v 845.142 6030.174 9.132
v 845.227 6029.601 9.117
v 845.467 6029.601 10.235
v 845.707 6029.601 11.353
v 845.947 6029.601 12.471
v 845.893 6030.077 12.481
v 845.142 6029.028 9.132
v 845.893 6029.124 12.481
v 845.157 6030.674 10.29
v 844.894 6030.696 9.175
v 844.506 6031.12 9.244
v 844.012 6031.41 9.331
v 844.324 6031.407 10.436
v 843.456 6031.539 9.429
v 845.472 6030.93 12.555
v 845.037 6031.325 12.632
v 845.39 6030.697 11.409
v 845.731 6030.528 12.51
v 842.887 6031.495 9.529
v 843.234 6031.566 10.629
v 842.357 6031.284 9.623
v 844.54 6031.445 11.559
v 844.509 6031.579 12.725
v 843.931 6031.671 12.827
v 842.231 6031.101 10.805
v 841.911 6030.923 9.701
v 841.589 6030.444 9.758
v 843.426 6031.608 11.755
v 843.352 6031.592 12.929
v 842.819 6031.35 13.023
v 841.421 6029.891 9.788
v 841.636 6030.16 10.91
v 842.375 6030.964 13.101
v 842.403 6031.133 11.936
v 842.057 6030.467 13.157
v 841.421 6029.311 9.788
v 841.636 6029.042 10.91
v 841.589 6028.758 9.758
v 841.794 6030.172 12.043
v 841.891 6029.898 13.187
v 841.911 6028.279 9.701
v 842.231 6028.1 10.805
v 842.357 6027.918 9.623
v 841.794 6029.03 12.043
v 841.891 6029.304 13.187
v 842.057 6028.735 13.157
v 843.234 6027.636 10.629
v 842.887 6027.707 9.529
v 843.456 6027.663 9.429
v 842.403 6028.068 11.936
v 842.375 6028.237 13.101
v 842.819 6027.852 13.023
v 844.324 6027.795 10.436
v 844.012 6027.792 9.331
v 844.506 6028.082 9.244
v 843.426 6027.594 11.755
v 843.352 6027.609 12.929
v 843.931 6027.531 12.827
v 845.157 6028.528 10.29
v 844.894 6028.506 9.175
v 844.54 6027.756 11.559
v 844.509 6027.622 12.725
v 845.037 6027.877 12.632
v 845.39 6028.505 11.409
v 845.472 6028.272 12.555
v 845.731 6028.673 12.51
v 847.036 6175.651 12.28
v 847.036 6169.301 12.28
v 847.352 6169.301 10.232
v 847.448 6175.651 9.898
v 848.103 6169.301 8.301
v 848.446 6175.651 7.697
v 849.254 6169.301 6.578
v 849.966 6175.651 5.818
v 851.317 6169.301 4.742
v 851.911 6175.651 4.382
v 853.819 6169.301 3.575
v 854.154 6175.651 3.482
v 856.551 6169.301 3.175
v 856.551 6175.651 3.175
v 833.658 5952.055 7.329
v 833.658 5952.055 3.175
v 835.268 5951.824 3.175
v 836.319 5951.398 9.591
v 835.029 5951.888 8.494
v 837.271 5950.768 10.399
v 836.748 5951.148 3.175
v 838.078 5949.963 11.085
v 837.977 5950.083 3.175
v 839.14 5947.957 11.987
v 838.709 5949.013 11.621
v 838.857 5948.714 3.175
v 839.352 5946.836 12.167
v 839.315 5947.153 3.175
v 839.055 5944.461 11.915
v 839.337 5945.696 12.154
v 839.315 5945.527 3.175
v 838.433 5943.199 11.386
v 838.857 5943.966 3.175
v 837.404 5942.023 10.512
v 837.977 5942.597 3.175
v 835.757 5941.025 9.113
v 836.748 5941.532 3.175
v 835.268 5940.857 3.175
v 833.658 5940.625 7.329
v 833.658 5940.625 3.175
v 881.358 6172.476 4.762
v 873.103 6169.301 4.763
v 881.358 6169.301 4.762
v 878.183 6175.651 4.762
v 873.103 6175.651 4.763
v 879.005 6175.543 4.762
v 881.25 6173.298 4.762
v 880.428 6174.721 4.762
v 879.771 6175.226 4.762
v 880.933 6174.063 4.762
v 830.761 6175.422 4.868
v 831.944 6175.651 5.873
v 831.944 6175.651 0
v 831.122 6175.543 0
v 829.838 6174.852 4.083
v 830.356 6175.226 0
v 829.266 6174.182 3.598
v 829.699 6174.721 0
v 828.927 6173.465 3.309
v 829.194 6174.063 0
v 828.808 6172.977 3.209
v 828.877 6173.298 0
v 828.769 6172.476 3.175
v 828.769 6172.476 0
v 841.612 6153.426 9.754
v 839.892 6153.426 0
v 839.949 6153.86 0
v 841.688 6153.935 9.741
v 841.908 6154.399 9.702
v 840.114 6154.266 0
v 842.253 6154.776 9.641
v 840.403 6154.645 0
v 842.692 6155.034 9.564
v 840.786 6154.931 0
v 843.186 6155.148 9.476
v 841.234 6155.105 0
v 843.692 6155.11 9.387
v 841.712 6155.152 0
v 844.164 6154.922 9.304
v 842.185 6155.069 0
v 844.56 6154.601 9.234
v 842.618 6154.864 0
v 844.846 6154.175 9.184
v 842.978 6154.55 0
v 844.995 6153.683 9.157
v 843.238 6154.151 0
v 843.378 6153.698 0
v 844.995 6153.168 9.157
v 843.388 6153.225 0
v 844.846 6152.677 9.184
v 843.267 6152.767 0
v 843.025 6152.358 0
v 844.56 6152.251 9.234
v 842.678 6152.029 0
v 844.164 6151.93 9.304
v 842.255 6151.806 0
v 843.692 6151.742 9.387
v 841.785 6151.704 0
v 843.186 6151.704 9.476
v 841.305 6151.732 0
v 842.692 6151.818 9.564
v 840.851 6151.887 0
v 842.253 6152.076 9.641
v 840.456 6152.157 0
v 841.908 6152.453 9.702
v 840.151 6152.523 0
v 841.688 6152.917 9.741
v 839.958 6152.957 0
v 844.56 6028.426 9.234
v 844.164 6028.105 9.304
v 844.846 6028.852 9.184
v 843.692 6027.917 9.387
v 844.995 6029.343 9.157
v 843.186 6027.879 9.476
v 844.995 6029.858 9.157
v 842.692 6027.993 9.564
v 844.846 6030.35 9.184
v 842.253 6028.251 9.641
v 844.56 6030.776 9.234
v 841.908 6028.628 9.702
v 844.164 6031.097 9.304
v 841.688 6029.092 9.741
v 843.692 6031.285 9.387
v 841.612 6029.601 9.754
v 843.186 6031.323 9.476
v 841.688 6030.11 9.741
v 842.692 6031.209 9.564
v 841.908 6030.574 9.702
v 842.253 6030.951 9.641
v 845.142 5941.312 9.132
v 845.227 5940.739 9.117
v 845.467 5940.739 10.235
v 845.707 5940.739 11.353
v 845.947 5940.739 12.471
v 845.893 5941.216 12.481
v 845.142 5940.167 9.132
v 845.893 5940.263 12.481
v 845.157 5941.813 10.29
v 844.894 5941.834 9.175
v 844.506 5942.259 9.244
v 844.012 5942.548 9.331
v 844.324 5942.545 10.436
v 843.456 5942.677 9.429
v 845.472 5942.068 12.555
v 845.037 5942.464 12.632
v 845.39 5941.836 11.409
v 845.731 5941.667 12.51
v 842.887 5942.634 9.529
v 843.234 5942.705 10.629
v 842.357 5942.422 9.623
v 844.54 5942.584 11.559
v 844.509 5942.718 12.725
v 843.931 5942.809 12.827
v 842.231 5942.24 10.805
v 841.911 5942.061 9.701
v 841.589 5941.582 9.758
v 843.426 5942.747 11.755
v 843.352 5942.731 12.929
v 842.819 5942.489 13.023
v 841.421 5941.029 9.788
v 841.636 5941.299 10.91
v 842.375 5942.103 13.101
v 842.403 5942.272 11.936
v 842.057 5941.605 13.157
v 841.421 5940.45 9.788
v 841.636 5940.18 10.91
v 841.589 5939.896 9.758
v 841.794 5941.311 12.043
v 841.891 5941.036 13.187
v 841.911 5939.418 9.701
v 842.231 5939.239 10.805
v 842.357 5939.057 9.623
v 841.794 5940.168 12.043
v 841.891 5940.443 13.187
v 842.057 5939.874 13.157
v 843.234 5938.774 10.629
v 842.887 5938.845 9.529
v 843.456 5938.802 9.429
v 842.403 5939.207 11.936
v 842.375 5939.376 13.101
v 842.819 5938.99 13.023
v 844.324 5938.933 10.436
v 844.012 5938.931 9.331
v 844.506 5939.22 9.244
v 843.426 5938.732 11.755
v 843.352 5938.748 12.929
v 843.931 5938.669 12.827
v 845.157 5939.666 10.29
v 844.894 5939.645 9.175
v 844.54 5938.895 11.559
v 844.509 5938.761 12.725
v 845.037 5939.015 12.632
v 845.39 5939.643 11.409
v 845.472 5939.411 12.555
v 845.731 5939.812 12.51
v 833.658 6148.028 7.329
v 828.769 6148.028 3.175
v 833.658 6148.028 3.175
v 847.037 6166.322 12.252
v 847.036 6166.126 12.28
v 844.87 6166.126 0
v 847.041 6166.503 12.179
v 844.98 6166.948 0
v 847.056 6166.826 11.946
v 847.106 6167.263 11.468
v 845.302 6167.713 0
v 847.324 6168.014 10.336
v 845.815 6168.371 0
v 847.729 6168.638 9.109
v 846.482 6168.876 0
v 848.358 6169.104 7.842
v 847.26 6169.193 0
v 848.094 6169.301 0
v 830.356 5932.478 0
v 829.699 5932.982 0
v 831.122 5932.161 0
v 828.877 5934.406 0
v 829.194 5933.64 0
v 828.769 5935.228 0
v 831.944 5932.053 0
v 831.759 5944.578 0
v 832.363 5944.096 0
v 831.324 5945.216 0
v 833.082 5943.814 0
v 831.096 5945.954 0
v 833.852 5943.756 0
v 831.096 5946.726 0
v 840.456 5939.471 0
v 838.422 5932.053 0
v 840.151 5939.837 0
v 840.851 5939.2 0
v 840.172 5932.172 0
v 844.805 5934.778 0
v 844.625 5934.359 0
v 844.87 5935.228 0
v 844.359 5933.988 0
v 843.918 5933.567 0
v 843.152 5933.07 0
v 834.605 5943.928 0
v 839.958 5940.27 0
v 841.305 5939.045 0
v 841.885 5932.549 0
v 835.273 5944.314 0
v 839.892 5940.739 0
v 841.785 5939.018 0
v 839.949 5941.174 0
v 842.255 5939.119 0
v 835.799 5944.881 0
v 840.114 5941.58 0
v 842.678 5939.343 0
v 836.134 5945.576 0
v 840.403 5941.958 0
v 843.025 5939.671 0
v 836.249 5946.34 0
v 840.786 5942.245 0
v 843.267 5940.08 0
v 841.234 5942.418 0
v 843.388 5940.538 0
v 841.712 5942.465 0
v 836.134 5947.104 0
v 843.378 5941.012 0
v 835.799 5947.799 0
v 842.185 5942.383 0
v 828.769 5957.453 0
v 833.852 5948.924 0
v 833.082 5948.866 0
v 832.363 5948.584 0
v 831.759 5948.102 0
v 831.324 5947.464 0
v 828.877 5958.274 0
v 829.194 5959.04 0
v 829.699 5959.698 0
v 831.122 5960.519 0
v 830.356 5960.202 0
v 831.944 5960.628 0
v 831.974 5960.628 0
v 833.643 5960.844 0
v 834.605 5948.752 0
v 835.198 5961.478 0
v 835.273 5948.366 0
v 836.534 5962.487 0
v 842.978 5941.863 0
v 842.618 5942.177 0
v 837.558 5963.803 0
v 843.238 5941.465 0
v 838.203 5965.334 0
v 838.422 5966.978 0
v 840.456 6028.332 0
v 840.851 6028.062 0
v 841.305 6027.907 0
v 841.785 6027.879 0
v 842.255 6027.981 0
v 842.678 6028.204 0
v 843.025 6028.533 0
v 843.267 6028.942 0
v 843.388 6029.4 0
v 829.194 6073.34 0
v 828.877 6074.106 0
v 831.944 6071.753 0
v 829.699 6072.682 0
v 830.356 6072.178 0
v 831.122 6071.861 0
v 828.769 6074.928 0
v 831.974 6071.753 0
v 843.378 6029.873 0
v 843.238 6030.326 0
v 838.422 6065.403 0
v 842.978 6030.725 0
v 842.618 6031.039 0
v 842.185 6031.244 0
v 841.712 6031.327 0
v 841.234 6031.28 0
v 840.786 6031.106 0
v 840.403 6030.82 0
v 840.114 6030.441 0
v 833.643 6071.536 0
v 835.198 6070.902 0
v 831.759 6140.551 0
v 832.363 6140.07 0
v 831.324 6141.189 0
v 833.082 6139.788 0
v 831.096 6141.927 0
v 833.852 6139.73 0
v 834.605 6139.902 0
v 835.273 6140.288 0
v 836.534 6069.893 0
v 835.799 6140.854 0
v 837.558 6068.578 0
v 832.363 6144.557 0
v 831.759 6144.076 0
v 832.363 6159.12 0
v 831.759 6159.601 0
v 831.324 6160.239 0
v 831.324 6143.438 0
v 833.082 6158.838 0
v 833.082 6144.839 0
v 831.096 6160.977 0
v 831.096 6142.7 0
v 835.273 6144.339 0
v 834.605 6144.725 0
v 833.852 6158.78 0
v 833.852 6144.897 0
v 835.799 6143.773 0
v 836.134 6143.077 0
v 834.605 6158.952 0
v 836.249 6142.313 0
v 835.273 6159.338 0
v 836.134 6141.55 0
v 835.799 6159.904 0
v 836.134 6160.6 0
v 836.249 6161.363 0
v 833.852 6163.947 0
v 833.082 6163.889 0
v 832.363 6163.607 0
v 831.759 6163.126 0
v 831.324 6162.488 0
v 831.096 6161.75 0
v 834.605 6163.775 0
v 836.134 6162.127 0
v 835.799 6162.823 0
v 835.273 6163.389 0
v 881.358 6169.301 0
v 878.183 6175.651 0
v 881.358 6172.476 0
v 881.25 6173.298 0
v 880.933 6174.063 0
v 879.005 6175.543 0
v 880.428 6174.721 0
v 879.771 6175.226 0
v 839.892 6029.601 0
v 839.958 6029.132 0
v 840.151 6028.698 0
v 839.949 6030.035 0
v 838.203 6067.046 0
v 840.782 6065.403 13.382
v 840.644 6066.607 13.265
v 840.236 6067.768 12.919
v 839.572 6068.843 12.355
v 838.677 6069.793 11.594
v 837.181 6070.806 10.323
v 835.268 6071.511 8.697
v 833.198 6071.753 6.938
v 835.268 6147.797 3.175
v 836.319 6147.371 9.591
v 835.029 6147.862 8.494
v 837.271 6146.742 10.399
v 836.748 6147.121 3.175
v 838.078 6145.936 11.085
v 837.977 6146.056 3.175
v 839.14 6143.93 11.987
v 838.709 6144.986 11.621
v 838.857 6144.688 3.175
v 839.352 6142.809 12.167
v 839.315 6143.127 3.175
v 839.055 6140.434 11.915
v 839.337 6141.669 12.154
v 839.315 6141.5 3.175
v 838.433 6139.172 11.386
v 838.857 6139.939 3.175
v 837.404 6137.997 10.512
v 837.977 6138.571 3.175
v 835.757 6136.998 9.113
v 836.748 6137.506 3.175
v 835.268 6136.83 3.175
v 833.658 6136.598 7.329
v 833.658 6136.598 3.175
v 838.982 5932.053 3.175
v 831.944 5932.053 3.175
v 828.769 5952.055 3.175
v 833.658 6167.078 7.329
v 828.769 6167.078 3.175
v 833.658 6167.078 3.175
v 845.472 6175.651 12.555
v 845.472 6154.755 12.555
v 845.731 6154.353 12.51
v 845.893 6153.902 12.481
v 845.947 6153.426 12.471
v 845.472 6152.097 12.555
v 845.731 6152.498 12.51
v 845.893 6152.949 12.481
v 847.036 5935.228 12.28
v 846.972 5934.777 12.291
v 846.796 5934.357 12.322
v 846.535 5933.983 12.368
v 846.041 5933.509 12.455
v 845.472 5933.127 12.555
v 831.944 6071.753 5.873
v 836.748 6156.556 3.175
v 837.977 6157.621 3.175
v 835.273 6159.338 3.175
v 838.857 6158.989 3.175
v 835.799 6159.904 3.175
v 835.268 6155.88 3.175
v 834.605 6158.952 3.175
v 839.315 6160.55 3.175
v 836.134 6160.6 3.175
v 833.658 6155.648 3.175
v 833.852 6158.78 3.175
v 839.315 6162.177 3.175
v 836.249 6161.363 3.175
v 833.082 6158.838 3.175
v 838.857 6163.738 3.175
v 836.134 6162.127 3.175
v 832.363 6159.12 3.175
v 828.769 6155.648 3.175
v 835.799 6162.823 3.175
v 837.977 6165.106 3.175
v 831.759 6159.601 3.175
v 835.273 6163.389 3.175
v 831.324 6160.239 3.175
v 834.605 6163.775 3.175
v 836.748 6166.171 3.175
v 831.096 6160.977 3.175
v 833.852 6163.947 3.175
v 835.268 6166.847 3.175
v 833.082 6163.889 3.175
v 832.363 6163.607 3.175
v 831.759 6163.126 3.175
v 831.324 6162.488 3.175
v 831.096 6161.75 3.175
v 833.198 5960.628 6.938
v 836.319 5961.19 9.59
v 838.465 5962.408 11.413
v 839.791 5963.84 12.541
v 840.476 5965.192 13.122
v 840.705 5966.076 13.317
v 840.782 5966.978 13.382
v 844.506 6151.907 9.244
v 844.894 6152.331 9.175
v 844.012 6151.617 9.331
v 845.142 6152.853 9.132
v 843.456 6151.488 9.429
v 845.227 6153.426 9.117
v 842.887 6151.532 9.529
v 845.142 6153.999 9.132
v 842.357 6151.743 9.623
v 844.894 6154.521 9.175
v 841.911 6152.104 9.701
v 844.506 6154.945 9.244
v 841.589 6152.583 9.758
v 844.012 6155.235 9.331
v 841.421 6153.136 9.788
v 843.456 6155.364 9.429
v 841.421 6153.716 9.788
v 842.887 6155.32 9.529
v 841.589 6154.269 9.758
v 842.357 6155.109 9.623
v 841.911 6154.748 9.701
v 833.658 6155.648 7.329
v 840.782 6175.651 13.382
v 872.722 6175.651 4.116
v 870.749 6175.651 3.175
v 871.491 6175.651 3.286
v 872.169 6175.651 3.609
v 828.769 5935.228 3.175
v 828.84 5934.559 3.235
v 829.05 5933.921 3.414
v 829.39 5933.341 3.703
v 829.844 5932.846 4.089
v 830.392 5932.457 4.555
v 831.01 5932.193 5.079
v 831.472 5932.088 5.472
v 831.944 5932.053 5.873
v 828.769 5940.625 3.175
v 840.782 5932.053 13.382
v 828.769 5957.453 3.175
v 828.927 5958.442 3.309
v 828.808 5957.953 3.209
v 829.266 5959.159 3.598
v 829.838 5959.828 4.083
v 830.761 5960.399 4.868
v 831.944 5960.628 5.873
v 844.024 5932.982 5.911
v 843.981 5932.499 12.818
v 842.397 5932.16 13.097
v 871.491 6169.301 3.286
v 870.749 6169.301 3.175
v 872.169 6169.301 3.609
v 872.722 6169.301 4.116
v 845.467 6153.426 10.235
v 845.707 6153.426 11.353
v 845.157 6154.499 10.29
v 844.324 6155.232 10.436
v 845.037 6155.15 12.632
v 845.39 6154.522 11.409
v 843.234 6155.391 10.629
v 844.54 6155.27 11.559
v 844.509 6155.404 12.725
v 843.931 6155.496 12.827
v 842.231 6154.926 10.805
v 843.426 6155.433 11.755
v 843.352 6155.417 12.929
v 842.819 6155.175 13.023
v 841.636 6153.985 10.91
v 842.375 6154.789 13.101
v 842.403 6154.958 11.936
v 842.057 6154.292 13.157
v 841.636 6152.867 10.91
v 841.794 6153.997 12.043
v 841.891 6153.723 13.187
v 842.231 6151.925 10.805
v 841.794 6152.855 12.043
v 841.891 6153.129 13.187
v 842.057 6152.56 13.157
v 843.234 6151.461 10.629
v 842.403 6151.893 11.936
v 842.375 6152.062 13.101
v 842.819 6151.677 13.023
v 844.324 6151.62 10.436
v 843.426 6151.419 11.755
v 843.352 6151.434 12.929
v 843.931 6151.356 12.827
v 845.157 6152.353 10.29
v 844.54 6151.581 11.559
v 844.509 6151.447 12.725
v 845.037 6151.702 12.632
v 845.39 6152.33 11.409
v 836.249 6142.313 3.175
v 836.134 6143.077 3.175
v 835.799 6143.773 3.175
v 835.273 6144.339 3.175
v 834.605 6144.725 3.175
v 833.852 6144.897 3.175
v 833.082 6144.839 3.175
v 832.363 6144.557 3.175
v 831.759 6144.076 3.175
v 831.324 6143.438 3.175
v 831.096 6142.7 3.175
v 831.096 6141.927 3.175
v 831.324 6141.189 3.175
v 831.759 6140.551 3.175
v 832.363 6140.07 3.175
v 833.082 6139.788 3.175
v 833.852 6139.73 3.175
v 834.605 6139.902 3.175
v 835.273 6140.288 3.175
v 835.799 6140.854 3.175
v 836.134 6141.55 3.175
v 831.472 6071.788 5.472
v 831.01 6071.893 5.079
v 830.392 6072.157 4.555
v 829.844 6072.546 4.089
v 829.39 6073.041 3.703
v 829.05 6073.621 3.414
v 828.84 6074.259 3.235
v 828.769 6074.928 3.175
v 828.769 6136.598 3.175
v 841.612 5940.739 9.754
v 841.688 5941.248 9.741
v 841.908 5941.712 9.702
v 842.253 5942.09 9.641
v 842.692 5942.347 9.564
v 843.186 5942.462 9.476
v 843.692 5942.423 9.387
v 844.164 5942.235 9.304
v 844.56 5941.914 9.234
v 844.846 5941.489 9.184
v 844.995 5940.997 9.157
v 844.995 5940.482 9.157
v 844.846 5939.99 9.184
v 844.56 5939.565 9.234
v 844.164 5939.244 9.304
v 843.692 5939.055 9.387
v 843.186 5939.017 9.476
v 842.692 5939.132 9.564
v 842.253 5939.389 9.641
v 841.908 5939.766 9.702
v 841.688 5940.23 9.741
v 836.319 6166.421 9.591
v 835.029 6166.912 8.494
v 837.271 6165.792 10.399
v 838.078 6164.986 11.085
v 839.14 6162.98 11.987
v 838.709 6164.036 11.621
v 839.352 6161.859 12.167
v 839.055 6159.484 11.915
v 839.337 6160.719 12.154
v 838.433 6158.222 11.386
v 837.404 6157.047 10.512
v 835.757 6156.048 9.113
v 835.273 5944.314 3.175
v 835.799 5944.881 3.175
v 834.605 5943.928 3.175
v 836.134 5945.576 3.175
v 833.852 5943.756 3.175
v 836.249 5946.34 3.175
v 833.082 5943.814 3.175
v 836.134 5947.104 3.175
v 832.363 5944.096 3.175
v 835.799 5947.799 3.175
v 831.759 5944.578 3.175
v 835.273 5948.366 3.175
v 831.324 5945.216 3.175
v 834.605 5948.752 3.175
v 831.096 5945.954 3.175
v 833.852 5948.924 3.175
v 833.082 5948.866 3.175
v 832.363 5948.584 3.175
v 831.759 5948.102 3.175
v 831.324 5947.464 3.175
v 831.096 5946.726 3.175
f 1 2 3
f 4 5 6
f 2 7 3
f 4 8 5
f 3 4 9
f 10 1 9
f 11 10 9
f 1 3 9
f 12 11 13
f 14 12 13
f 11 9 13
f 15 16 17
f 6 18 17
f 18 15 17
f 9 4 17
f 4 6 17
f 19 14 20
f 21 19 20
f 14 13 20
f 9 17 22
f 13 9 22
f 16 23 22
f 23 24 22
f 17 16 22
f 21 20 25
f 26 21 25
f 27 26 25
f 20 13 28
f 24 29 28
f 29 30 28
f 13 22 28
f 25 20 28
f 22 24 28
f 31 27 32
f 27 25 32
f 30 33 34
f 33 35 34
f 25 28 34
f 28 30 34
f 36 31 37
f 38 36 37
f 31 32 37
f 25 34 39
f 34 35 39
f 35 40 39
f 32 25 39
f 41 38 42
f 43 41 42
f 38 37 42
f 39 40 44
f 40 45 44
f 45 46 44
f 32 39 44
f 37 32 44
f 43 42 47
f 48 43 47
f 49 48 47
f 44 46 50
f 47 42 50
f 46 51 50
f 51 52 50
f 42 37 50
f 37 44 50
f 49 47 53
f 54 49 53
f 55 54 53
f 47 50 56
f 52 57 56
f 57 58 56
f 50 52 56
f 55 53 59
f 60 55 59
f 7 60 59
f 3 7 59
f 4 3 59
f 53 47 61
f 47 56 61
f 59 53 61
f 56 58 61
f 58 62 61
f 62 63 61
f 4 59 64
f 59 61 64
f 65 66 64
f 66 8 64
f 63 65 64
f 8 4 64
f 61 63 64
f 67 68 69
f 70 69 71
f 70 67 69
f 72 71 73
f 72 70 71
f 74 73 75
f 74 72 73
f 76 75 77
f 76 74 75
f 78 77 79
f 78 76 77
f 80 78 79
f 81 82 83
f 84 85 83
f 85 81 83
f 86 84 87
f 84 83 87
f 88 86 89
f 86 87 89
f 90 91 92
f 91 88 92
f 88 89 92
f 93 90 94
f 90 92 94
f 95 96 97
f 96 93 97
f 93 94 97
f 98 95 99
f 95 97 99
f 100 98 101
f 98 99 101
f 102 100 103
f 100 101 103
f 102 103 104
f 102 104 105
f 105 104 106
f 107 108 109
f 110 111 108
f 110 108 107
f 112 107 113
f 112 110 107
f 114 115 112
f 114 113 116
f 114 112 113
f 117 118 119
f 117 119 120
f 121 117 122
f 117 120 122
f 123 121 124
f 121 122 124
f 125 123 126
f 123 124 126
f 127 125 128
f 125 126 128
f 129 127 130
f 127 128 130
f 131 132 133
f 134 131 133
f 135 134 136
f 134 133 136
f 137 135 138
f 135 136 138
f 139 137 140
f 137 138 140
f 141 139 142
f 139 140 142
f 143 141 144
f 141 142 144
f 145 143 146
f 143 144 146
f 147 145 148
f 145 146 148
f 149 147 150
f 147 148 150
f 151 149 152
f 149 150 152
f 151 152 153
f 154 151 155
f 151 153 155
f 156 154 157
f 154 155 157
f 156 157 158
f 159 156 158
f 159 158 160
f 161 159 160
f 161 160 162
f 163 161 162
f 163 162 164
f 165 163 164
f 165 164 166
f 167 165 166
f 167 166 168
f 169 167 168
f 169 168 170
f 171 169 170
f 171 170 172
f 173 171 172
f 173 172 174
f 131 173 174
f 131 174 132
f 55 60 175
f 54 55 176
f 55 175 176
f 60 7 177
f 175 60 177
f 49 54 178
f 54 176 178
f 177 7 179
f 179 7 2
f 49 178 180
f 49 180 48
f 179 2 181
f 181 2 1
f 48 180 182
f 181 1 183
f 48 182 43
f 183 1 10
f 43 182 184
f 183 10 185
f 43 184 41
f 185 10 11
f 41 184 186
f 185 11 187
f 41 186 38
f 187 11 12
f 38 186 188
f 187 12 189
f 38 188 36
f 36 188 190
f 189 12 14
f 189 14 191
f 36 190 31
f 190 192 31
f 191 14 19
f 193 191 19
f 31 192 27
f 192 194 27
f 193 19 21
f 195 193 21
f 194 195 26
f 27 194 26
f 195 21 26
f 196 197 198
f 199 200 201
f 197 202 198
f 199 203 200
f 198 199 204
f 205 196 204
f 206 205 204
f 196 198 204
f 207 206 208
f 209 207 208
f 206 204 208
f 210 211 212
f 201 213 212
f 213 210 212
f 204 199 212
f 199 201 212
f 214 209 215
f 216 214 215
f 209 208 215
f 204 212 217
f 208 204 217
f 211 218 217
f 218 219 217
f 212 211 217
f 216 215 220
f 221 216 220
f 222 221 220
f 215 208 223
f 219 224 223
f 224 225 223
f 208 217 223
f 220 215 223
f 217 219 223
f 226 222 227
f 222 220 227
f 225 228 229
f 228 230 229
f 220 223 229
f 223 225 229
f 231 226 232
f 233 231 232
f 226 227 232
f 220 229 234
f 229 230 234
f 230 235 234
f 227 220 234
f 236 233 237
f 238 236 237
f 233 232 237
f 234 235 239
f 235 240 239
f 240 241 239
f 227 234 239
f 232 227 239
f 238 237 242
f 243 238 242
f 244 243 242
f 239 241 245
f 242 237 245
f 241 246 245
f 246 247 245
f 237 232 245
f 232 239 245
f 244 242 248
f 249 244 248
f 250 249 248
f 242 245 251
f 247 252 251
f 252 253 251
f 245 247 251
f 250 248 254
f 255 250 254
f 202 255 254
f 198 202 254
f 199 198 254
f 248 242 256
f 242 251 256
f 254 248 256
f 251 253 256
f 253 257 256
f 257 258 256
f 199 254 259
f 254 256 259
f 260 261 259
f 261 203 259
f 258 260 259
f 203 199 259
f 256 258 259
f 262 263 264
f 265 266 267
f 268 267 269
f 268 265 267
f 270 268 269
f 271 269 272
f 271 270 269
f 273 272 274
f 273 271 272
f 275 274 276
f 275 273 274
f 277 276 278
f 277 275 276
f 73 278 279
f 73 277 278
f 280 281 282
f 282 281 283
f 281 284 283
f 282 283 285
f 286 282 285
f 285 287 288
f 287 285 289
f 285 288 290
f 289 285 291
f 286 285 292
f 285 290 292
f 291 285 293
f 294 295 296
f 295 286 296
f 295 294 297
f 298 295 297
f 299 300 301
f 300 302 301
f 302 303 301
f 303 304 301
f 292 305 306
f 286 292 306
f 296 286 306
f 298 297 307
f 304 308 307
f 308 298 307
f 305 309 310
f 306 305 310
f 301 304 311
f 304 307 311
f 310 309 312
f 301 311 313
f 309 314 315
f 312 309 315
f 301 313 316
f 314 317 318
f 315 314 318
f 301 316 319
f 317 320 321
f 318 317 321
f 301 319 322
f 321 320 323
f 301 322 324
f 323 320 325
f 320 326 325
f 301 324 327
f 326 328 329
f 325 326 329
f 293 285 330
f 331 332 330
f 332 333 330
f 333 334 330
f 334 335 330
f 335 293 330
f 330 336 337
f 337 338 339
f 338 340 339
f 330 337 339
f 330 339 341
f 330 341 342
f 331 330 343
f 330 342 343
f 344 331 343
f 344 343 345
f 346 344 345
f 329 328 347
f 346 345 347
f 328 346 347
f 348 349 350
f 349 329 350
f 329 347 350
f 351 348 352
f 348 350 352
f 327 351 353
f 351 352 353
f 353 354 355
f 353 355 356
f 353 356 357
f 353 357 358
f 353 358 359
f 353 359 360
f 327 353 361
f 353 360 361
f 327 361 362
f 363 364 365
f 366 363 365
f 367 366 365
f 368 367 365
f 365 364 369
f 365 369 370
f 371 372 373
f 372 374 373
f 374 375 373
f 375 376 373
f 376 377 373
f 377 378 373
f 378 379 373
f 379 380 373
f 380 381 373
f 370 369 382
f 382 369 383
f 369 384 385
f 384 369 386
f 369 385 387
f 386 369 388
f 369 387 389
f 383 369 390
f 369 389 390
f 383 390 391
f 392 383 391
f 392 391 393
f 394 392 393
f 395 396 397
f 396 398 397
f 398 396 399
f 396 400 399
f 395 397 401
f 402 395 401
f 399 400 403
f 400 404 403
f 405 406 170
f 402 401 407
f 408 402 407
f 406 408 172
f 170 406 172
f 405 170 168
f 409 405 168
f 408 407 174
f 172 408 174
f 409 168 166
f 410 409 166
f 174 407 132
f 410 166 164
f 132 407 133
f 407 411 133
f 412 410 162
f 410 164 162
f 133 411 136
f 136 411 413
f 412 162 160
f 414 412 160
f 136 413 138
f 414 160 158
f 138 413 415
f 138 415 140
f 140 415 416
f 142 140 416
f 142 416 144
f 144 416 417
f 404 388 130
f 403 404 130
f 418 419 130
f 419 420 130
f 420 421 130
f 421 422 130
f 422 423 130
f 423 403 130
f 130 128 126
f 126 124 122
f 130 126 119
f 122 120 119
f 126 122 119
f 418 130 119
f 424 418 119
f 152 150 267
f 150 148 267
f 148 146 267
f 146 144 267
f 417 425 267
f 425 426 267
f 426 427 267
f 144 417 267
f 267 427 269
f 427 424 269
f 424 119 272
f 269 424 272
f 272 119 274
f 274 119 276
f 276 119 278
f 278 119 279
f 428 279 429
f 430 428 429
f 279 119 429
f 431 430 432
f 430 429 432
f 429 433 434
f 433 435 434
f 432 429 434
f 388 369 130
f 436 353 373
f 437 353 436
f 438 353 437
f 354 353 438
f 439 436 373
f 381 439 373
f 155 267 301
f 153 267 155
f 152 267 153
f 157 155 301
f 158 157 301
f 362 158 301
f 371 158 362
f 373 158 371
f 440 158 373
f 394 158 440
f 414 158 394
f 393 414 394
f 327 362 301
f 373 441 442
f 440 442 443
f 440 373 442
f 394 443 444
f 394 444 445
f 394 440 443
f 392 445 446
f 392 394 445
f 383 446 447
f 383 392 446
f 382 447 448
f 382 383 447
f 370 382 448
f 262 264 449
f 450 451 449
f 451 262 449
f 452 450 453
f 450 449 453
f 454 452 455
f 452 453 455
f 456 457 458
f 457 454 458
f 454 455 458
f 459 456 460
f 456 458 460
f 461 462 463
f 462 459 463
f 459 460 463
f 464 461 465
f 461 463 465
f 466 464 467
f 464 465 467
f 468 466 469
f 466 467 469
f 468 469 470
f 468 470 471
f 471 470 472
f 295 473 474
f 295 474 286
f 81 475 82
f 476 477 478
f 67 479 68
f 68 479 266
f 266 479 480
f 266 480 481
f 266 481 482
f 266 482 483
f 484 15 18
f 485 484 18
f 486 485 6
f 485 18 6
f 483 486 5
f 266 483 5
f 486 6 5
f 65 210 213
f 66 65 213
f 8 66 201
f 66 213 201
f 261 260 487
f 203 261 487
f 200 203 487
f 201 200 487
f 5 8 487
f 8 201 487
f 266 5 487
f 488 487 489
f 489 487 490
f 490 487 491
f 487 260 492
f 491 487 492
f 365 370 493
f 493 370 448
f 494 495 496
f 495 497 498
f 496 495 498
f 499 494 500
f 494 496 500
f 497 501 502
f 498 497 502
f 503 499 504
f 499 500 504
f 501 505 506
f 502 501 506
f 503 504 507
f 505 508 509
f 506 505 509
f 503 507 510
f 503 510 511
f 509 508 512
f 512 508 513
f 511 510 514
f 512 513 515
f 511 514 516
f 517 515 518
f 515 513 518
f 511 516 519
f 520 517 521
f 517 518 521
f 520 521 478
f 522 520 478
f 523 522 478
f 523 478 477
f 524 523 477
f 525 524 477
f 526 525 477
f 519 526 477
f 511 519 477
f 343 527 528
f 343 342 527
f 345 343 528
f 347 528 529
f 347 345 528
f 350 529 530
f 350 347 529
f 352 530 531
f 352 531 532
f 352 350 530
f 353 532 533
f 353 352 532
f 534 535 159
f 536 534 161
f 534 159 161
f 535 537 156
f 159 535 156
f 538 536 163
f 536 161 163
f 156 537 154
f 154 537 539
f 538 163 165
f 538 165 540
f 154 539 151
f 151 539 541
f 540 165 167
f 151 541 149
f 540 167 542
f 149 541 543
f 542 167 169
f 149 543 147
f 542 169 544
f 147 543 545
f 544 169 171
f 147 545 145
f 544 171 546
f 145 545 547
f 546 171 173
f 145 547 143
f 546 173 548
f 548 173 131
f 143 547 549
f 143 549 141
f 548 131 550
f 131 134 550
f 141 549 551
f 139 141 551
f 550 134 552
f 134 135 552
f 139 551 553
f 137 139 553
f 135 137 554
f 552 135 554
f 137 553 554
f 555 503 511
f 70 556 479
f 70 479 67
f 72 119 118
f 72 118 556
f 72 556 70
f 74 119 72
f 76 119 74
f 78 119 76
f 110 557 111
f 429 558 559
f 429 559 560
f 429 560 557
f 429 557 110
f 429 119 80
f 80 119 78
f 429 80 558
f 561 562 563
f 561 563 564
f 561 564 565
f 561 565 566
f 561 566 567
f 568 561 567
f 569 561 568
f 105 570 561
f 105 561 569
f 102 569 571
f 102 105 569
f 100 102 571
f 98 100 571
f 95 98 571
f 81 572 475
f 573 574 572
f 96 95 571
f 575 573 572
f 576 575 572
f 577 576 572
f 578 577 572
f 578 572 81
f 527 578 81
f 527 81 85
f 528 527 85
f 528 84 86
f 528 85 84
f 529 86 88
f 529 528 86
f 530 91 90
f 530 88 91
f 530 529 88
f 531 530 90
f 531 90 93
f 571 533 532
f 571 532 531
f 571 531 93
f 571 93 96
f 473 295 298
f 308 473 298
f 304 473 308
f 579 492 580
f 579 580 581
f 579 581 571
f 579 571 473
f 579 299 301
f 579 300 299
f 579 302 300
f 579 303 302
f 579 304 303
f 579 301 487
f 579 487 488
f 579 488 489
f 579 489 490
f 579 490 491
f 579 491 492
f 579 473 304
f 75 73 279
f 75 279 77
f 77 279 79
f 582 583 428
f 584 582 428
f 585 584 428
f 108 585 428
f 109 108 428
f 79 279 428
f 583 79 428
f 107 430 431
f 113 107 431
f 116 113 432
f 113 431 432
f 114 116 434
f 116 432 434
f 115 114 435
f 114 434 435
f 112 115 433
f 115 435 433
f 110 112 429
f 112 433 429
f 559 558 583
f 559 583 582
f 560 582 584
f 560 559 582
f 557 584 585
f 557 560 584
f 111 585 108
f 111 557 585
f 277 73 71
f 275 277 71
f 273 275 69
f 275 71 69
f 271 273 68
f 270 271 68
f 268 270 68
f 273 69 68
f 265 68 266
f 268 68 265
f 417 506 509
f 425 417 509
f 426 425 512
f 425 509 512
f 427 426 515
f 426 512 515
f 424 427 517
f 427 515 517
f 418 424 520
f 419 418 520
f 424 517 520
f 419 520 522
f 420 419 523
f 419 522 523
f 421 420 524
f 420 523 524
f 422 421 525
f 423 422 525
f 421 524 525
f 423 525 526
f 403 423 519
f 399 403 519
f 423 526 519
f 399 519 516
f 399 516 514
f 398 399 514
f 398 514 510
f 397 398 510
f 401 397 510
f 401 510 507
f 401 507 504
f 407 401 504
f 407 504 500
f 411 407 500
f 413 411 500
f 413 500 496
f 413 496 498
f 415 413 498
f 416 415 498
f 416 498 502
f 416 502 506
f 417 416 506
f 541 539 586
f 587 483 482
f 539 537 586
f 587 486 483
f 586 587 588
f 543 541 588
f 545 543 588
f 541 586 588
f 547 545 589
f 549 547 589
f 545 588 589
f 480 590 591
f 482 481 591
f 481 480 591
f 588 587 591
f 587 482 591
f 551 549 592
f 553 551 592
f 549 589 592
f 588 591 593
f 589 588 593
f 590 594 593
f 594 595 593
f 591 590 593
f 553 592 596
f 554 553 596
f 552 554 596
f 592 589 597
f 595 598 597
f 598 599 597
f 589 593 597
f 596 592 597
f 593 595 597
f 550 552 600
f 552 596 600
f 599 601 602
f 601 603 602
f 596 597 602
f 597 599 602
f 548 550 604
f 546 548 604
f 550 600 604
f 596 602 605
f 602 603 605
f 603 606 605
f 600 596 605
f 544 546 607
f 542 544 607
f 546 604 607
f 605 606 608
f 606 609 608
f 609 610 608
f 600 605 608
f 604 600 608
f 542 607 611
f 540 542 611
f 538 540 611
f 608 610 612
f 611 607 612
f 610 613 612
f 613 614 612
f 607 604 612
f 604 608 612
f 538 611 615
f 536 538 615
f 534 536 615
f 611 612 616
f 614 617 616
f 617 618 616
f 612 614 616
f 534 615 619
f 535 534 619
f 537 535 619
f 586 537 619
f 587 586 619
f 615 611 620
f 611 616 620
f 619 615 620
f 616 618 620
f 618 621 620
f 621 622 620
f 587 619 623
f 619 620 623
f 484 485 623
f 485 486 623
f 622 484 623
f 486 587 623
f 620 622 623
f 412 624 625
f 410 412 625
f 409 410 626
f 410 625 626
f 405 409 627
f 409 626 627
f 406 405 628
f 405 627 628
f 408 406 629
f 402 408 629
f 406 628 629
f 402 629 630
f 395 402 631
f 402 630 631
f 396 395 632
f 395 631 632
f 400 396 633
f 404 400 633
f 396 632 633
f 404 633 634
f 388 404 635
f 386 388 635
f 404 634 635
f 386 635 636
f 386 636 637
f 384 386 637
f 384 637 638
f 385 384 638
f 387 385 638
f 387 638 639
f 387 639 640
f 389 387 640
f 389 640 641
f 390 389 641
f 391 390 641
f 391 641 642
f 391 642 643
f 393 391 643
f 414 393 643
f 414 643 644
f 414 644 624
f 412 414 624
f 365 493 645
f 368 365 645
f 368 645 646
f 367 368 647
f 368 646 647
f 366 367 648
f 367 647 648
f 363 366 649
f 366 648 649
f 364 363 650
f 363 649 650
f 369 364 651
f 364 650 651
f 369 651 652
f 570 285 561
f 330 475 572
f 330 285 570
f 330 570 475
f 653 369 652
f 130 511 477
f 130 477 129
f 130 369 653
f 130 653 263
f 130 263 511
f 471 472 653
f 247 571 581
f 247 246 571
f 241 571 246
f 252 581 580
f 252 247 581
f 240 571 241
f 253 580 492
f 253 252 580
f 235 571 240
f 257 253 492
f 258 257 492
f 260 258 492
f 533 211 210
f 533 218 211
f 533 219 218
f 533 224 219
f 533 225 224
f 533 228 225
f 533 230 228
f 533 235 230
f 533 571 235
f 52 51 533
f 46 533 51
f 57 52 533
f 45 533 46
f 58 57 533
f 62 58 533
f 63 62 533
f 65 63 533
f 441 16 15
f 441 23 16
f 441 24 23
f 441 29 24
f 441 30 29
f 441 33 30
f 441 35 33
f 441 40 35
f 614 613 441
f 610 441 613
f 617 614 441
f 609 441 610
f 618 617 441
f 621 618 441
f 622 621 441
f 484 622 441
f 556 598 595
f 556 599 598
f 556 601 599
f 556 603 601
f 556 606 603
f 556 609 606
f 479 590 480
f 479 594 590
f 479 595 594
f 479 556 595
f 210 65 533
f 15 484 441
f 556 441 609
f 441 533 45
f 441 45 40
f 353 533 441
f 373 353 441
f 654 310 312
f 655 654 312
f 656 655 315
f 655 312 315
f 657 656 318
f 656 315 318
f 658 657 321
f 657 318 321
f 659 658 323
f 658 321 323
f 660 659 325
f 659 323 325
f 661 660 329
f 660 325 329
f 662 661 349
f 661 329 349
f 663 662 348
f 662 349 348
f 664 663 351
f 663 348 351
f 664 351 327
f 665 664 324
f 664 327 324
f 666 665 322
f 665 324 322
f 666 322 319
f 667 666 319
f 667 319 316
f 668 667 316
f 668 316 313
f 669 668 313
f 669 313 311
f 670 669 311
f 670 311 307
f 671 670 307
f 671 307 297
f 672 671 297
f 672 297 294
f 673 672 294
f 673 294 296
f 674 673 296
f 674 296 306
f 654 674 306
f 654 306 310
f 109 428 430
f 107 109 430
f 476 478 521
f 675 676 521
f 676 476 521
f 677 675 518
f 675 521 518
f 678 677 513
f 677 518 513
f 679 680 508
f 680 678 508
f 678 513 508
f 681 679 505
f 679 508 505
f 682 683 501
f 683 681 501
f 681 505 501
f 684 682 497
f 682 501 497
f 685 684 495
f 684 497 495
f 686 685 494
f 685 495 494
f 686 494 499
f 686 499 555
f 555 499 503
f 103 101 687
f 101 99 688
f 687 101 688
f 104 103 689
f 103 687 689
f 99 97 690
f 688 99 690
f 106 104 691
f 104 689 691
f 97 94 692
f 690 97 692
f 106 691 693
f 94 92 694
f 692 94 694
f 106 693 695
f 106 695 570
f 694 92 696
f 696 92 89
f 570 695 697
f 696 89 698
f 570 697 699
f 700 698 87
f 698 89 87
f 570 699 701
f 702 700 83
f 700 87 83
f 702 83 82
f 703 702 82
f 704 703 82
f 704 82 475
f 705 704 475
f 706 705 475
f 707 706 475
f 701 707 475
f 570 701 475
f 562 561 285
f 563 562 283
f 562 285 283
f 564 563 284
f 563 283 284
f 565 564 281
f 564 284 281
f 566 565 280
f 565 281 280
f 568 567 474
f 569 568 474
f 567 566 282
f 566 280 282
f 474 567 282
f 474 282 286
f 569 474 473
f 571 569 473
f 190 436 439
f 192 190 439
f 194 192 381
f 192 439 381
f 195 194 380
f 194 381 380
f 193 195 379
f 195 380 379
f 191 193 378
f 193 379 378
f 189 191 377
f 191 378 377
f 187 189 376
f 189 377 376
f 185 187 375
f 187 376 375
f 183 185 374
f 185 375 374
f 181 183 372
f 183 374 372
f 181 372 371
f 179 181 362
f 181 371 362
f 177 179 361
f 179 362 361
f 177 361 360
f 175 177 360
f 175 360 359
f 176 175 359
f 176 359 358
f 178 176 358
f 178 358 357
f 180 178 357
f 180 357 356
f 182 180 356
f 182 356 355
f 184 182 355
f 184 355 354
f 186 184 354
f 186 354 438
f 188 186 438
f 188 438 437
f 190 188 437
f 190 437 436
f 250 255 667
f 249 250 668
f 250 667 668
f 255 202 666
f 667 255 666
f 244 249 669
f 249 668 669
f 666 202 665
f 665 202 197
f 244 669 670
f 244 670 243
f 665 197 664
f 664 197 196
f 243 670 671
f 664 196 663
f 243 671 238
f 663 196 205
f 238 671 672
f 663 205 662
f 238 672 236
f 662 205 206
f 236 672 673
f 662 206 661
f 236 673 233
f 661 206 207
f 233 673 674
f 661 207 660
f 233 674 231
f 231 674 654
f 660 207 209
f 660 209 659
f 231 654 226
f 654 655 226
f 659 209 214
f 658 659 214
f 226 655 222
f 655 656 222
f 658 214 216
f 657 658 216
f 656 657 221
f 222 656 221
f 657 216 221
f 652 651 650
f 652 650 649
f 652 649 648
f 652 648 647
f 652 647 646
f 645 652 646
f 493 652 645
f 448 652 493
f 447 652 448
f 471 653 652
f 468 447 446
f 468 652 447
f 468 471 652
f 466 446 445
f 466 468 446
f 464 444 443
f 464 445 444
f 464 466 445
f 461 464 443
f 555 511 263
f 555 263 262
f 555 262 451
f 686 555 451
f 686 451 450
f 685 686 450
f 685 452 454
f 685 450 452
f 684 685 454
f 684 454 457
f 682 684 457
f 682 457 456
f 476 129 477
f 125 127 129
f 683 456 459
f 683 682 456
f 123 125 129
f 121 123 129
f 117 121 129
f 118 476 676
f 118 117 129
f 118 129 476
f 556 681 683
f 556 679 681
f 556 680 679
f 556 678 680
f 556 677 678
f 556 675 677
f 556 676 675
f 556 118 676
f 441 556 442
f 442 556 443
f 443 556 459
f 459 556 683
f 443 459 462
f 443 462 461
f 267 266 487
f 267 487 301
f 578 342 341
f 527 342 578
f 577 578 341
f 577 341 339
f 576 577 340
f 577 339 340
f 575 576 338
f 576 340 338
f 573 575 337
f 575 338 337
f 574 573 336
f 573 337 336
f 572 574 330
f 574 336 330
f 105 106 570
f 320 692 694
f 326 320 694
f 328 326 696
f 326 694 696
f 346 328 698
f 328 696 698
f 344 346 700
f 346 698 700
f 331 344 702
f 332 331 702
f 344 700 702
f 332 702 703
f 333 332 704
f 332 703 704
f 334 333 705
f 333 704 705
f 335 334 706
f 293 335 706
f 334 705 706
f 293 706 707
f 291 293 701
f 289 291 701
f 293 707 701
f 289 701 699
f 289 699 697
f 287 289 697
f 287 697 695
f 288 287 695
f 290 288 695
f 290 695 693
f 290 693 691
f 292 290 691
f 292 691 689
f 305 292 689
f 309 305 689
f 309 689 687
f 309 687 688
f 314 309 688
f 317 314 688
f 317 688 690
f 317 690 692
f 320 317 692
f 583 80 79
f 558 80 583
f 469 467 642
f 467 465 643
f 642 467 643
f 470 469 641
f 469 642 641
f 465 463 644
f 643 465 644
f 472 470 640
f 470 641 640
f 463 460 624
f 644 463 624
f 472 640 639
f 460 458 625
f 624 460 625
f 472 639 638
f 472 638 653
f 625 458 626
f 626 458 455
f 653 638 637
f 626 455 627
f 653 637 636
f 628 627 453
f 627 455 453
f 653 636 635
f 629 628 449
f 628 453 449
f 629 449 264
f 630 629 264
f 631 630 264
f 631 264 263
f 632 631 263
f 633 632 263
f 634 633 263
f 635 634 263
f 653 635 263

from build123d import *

# Parameters (mm, degrees)
SKETCH2_W                  = 82.738044028
SKETCH2_H                  = 243.598411898
BOSS_EXTRUDE1_DEPTH        = 3.175
BOSS_EXTRUDE2_DEPTH        = 243.598412
CUT_EXTRUDE1_DEPTH         = 6253.234293578
CUT_EXTRUDE1_DEPTH_BACK    = 6253.234293578
SKETCH3_W                  = 10.058364279
SKETCH3_H                  = 111.125
FILLET1_R                  = 6.35
CUT_EXTRUDE2_DEPTH         = 6243.564603497
DELETEFACE2_START          = 830.447299741
DELETEFACE2_OUTLINE_W      = 243.598411898
DELETEFACE2_OUTLINE_H      = 6
DELETEFACE2_DEPTH          = 0.551332964
F_6_0_204_DIAMETER_HOLE1_D = 5.1816
CUT_EXTRUDE3_START         = 3.175
CUT_EXTRUDE3_DEPTH         = 6231.095925463
SKETCH10_W                 = 38.1
SKETCH10_H                 = 3.175
BOSS_EXTRUDE4_DEPTH        = 6.35
BOSS_EXTRUDE6_DEPTH        = 1.5875
CUT_EXTRUDE4_DEPTH         = 913.829845298
FILLET2_R                  = 9.525
FILLET3_R                  = 3.175
SKETCH13_W                 = 8.255
SKETCH13_H                 = 6.35
BOSS_EXTRUDE5_DEPTH        = 1.5875
FILLET4_R                  = 2.54
FILLET5_SIZE               = 6.35
FILLET5_SIZE_2             = 3.175
FILLET6_R                  = 3.175
HOLE1_AT_2_COUNT           = 2
HOLE1_AT_2_PITCH           = 123.825
HOLE1_AT_3_COUNT           = 2
HOLE1_AT_3_PITCH           = 212.6865263
F_4_CLEARANCE_HOLE1_D      = 3.4544


# Read off the part's stored shape, not the designer's step: DeleteFace2
with BuildPart() as part:
    # Sketch2 → Boss-Extrude1 (new body)
    with BuildSketch(Plane.XY):
        with Locations((870.137648104, 6053.851709568)):
            Rectangle(SKETCH2_W, SKETCH2_H)
    extrude(amount=BOSS_EXTRUDE1_DEPTH)

    # Sketch5 → Boss-Extrude2 (add, through all)
    with BuildSketch(Plane(origin=(0, 6175.650915517, 0), x_dir=(1, 0, 0), z_dir=(0, 1, 0))):
        Polygon((828.76862609, -3.175), (840.781978058, -13.382293294), (845.472124982, -12.555293847), (843.81812609, -3.175), align=None)
    extrude(amount=-BOSS_EXTRUDE2_DEPTH)

    # Sketch3 → Cut-Extrude1 (cut, two sides: drawn at the far end of the back side and taken through both)
    with BuildSketch(Plane(origin=(1789.89403363, 0, -153.971769821), x_dir=(-0.9848077530122082, 0, 0.17364817766692958), z_dir=(-0.17364817766692958, 0, -0.9848077530122082)).offset(-CUT_EXTRUDE1_DEPTH_BACK)):
        with Locations((968.782821029, 6016.190003619)):
            Rectangle(SKETCH3_W, SKETCH3_H)
    extrude(amount=CUT_EXTRUDE1_DEPTH + CUT_EXTRUDE1_DEPTH_BACK, mode=Mode.SUBTRACT)

    # Fillet1
    fillet1_edges = [part.edges().sort_by_distance(p)[0] for p in [
        (839.602148372, 6071.752503619, 6.691146647),
        (839.602148372, 5960.627503619, 6.691146647),
    ]]
    fillet(fillet1_edges, radius=FILLET1_R)

    # Sketch4 → Cut-Extrude2 (cut, through all)
    with BuildSketch(Plane.XY.offset(3.175)):
        Polygon((843.81812609, 6170.570915517), (843.81812609, 6175.650915517), (911.506670118, 6175.650915517), (911.506670118, 5932.052503619), (905.156670118, 5932.052503619), (843.81812609, 5932.052503619), align=None)
    extrude(amount=-CUT_EXTRUDE2_DEPTH, mode=Mode.SUBTRACT)

    # DeleteFace2 outline → DeleteFace2 (cut)
    with BuildSketch(Plane(origin=(0, 0, 0), x_dir=(0, 1, 0), z_dir=(0.984807753012209, 0, -0.173648177666925)).offset(DELETEFACE2_START)):
        with Locations((6053.851709568, 148)):
            Rectangle(DELETEFACE2_OUTLINE_W, DELETEFACE2_OUTLINE_H)
    extrude(amount=DELETEFACE2_DEPTH, mode=Mode.SUBTRACT)

    # #6 (0.204) Diameter Hole1 (through all)
    with Locations(Plane(origin=(0, 0, 0), x_dir=(-1, 0, 0), z_dir=(0, 0, -1))):
        with Locations((-833.65812609, 6161.363415517), (-833.65812609, 6142.313415517), (-833.65812609, 5946.340003619)):
            Hole(F_6_0_204_DIAMETER_HOLE1_D / 2)

    # Sketch8 → Cut-Extrude3 (cut, through all)
    with BuildSketch(Plane.XY.offset(CUT_EXTRUDE3_START)):
        with BuildLine():
            Line((833.65812609, 6155.648415517), (828.76862609, 6155.648415517))
            ThreePointArc((828.76862609, 6155.648415517), (823.05362609, 6161.363415517), (828.76862609, 6167.078415517))
            Line((828.76862609, 6167.078415517), (833.65812609, 6167.078415517))
            ThreePointArc((833.65812609, 6167.078415517), (839.37312609, 6161.363415517), (833.65812609, 6155.648415517))
        make_face()
        with BuildLine():
            Line((833.65812609, 6136.598415517), (828.76862609, 6136.598415517))
            ThreePointArc((828.76862609, 6136.598415517), (823.05362609, 6142.313415517), (828.76862609, 6148.028415517))
            Line((828.76862609, 6148.028415517), (833.65812609, 6148.028415517))
            ThreePointArc((833.65812609, 6148.028415517), (839.37312609, 6142.313415517), (833.65812609, 6136.598415517))
        make_face()
        with BuildLine():
            Line((833.65812609, 5940.625003619), (828.76862609, 5940.625003619))
            ThreePointArc((828.76862609, 5940.625003619), (823.05362609, 5946.340003619), (828.76862609, 5952.055003619))
            Line((828.76862609, 5952.055003619), (833.65812609, 5952.055003619))
            ThreePointArc((833.65812609, 5952.055003619), (839.37312609, 5946.340003619), (833.65812609, 5940.625003619))
        make_face()
    extrude(amount=CUT_EXTRUDE3_DEPTH, mode=Mode.SUBTRACT)

    # Sketch10 → Boss-Extrude4 (add)
    with BuildSketch(Plane(origin=(0, 6175.650915517, 0), x_dir=(1, 0, 0), z_dir=(0, 1, 0))):
        with Locations((862.308287926, -1.5875)):
            Rectangle(SKETCH10_W, SKETCH10_H)
    extrude(amount=-BOSS_EXTRUDE4_DEPTH)

    # Sketch14 → Boss-Extrude6 (add)
    with BuildSketch(Plane(origin=(817.830939253, 0, -144.205660248), x_dir=(-0.17364817766692534, 0, -0.9848077530122089), z_dir=(0.9848077530122089, 0, -0.17364817766692534))):
        Polygon((-149.654244494, 6169.300915517), (-149.654244494, 6175.650915517), (-159.179244494, 6175.650915517), (-159.179244494, 5932.052503619), (-146.430265001, 5932.052503619), (-146.430265001, 6169.300915517), align=None)
    extrude(amount=BOSS_EXTRUDE6_DEPTH)

    # Sketch15 → Cut-Extrude4 (cut, through all)
    with BuildSketch(Plane(origin=(0, 6169.300915517, 0), x_dir=(1, 0, 0), z_dir=(0, 1, 0))):
        Polygon((843.258287926, 0), (844.870277672, 0), (844.821670234, 0.275666482), align=None)
    extrude(amount=-CUT_EXTRUDE4_DEPTH, mode=Mode.SUBTRACT)

    # Fillet2
    # the kernel refuses this fillet: 9.525 mm, written as the material it adds along each edge
    with BuildSketch(Plane(origin=(845.430115836, 6175.650915517, 3.175), x_dir=(1, 0, 0), z_dir=(0, -1, 0))) as fillet2_piece_1:
        with BuildLine():
            CenterArc((11.121110651, 9.525), FILLET2_R, 182.529491184, 87.470508816)
            Line((1.605391454, 9.104627365), (1.41507707, 9.096219913))
            ThreePointArc((1.41507707, 9.096219913), (0.61508985, 4.585393661), (-0.187605877, 0.033079978))
            Line((-0.187605877, 0.033079978), (0, -0.1905))
            Line((0, -0.1905), (11.121110651, -0.1905))
            Line((11.121110651, -0.1905), (11.121110651, 0))
        make_face()
    extrude(amount=6.35)

    # Fillet3
    # the kernel refuses this fillet: 3.175 mm, written as the material it adds along each edge
    with BuildSketch(Plane(origin=(847.03550729, 6169.300915517, 12.279627365), x_dir=(0.9848077530122001, 0, -0.17364817766697505), z_dir=(-0.17364817766697507, 0, -0.9848077530122002))) as fillet3_piece_1_section:
        with BuildLine():
            CenterArc((FILLET3_R, FILLET3_R), FILLET3_R, 180, 90)
            Line((0, FILLET3_R), (0, 0))
            Line((0, 0), (FILLET3_R, 0))
        make_face()
    fillet3_piece_1 = extrude(amount=20.406560411, mode=Mode.PRIVATE)
    fillet3_piece_1 = fillet3_piece_1 - Plane(origin=(856.551226487, 6168.523076842, 12.7), x_dir=(1, 0, 0), z_dir=(0, 1, 0)) * Cylinder(9.525, 54, mode=Mode.PRIVATE)
    fillet3_piece_1 = split(fillet3_piece_1, bisect_by=Plane(origin=(846.439228991, 6168.523076842, 0), z_dir=(0, 0, 1)), keep=Keep.TOP, mode=Mode.PRIVATE)
    add(fillet3_piece_1)

    # Sketch13 → Boss-Extrude5 (add)
    with BuildSketch(Plane.XY.offset(3.175)):
        with Locations((877.230787926, 6172.475915517)):
            Rectangle(SKETCH13_W, SKETCH13_H)
    extrude(amount=BOSS_EXTRUDE5_DEPTH)

    # Fillet4
    # the kernel refuses this fillet: 2.54 mm, written as the material it adds along each edge
    with BuildSketch(Plane(origin=(873.103287926, 6175.650915517, 3.175), x_dir=(-1, 0, 0), z_dir=(0, -1, 0))) as fillet4_piece_1:
        with BuildLine():
            CenterArc((2.35464302, -2.54), FILLET4_R, 90, 67.975687163)
            Line((0, -1.5875), (-0.04709286, -1.56845))
            ThreePointArc((-0.04709286, -1.56845), (-0.0508, -0.79375), (-0.0508, 0))
            Line((-0.0508, 0), (0, 0.0508))
            Line((0, 0.0508), (2.35464302, 0.0508))
            Line((2.35464302, 0.0508), (2.35464302, 0))
        make_face()
    extrude(amount=6.35)

    # Fillet5
    # an asymmetric fillet: 6.35, 3.175 mm, written as the material it takes off along each edge
    with BuildSketch(Plane(origin=(849.79217211, 5932.052503619, 27.913450444), x_dir=(-0.9848077530122089, 0, 0.17364817766692534), z_dir=(-0.17364817766692536, 0, -0.984807753012209))) as fillet5_piece_1:
        with BuildLine():
            Bezier((FILLET5_SIZE, 0), (0, 0), (0, FILLET5_SIZE_2), weights=[1, 0.707106781, 1])
            Line((0, FILLET5_SIZE_2), (0, 0))
            Line((0, 0), (FILLET5_SIZE, 0))
        make_face()
    extrude(amount=44.219060411, mode=Mode.SUBTRACT)

    # Fillet6
    # the kernel refuses this fillet: 3.175 mm, written as the material it takes off along each edge
    with BuildSketch(Plane(origin=(828.76862609, 6175.650915517, -7.9375), x_dir=(1, 0, 0), z_dir=(0, 0, 1))) as fillet6_piece_1:
        with BuildLine():
            CenterArc((FILLET6_R, -FILLET6_R), FILLET6_R, 90, 90)
            Line((0, -FILLET6_R), (0, 0))
            Line((0, 0), (FILLET6_R, 0))
        make_face()
    extrude(amount=19.05, mode=Mode.SUBTRACT)
    with BuildSketch(Plane(origin=(828.76862609, 5932.052503619, -7.9375), x_dir=(1, 0, 0), z_dir=(0, 0, 1)), Plane(origin=(828.76862609, 5960.627503619, -7.9375), x_dir=(0, -1, 0), z_dir=(0, 0, 1)), Plane(origin=(828.76862609, 6071.752503619, 11.1125), x_dir=(0, 1, 0), z_dir=(0, 0, -1))) as fillet6_piece_2:
        with BuildLine():
            CenterArc((FILLET6_R, FILLET6_R), FILLET6_R, 180, 90)
            Line((0, FILLET6_R), (0, 0))
            Line((0, 0), (FILLET6_R, 0))
        make_face()
    extrude(amount=19.05, mode=Mode.SUBTRACT)
    with BuildSketch(Plane(origin=(881.358287926, 6175.650915517, -7.9375), x_dir=(-1, 0, 0), z_dir=(0, 0, 1))) as fillet6_piece_3:
        with BuildLine():
            CenterArc((FILLET6_R, FILLET6_R), FILLET6_R, 180, 90)
            Line((0, FILLET6_R), (0, 0))
            Line((0, 0), (FILLET6_R, 0))
        make_face()
    extrude(amount=20.6375, mode=Mode.SUBTRACT)

    # Sketch17 → Hole1 (revolve, cut)
    with BuildSketch(Plane(origin=(843.908742674, 6153.425915517, 12.830960329), x_dir=(0.9848077530122085, 0, -0.17364817766692853), z_dir=(0, 1, 0))):
        Polygon((0, 0), (0, 3.429), (1.9431, 3.429), (2.0701, 0), align=None)
    hole1 = revolve(axis=Axis((824.807443131, 6153.425915517, -95.497892502), (0.1736481776669289, 0, 0.9848077530122084)), mode=Mode.SUBTRACT)

    # Hole1 at 2: Hole1 ×2
    with Locations(*[(0, -i * HOLE1_AT_2_PITCH, 0) for i in range(1, HOLE1_AT_2_COUNT)]):
        add(hole1, mode=Mode.SUBTRACT)

    # Hole1 at 3: Hole1 ×2
    with Locations(*[(0, -i * HOLE1_AT_3_PITCH, 0) for i in range(1, HOLE1_AT_3_COUNT)]):
        add(hole1, mode=Mode.SUBTRACT)

    # #4 Clearance Hole1 (through all)
    with Locations(Plane(origin=(27.641185729, 0, 156.760954096), x_dir=(0.9848077530122085, 0, -0.17364817766692853), z_dir=(0.17364817766692853, 0, 0.9848077530122085))):
        with Locations((828.859799741, 5940.739389217), (828.859799741, 6029.600915517), (828.859799741, 6153.425915517)):
            Hole(F_4_CLEARANCE_HOLE1_D / 2)


solid = part.part
